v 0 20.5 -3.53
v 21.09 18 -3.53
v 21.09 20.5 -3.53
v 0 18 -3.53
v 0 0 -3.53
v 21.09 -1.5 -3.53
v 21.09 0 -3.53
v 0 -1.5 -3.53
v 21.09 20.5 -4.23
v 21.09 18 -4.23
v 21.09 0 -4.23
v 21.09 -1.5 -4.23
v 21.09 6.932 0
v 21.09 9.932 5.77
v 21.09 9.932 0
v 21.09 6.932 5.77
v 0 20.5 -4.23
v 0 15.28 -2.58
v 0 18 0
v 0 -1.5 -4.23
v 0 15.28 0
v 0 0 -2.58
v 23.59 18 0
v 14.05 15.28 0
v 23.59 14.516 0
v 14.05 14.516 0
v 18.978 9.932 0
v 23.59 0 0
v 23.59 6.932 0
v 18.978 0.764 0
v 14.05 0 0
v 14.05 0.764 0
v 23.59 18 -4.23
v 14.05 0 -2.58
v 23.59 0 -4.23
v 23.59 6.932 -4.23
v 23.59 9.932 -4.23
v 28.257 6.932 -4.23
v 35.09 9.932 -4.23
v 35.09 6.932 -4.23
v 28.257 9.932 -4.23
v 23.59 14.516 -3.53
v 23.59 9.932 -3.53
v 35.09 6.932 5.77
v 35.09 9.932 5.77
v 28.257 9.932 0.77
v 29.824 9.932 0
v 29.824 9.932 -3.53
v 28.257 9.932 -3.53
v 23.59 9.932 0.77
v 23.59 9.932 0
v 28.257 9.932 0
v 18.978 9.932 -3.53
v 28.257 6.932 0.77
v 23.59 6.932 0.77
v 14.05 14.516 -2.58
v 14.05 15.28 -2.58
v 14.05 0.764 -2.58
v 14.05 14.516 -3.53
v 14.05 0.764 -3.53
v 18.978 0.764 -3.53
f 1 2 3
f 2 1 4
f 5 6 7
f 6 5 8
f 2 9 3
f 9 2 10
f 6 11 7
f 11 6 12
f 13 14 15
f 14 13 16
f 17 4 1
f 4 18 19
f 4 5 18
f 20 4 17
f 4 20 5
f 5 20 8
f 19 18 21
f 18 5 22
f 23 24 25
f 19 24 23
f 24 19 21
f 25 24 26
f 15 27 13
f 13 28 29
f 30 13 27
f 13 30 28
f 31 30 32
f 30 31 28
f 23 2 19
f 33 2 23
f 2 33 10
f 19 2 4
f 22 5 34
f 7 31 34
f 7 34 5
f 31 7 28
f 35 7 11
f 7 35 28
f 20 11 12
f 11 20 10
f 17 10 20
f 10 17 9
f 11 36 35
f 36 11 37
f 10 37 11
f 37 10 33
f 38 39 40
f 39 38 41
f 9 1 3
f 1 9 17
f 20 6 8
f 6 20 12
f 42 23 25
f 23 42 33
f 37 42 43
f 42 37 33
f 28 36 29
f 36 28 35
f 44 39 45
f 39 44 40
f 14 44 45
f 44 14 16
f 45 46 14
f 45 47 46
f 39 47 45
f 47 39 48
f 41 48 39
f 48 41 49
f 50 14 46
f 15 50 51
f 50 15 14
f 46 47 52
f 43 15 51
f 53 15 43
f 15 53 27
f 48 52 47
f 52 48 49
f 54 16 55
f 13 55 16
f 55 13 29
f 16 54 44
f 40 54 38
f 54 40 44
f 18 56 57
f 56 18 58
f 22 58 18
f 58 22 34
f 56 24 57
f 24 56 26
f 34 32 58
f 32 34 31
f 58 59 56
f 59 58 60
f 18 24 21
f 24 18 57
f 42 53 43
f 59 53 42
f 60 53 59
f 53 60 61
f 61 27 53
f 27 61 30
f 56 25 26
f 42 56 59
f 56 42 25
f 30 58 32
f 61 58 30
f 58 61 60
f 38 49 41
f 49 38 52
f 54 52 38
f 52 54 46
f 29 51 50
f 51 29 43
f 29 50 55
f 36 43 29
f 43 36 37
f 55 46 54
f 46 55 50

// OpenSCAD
// Holder for matching FTDI 6 pin 0.1" header to the T2 case debug
// uart cutout

// External base measurements
// debug uart case cutout
cutoutXMM =  3.53;
cutoutYMM = 19.00;
cutoutZMM = 21.09;  // To base of male header

// FTDI 6 pin 0.1" measurements
serialXMM =  2.58;
serialYMM = 15.28;
serialZMM = 14.05;

// Internal base measurements
serialExtraYMM = 0.0;

cutoutReliefYMM = 1.0;

flangeExtraXMM = 0.35;
flangeExtraYMM = 3.00;
flangeExtraZMM = 0.00;

shoeBoxZMM = 2.50;

grabTabXMM = 10.00;
grabTabYMM =  3.00;
grabTabZMM = 14.00;

module handle() {
     effectiveCutoutYMM = cutoutYMM-cutoutReliefYMM;
     init = [cutoutXMM,effectiveCutoutYMM,cutoutZMM];
     hdr =  [serialXMM,serialYMM+serialExtraYMM,serialZMM];

     flangeSize=[2*flangeExtraXMM,
                 cutoutYMM+flangeExtraYMM,
                 cutoutZMM+flangeExtraZMM];
     flangePos=[cutoutXMM,-flangeExtraYMM/2,0];

     wireBoxSize = [cutoutXMM,
                    .90*hdr[1],
                    .70*(cutoutZMM-serialZMM)];
     wireBoxPos = [0,(hdr[1]-wireBoxSize[1])/2,serialZMM];

     shoeBoxSize = [cutoutXMM+2*flangeExtraXMM,effectiveCutoutYMM,shoeBoxZMM];
     shoeBoxPos = [0,0,cutoutZMM];

     wireExitSize = [cutoutXMM,
                     wireBoxSize[1]/3,
                     (cutoutZMM-shoeBoxSize[2]-0*serialZMM)-wireBoxSize[2]];
     wireExitPos = [0,wireBoxPos[1]+wireBoxSize[1]-wireExitSize[1],cutoutZMM-wireBoxSize[2]];

     grabTabSize = [grabTabXMM,grabTabYMM,grabTabZMM];
     grabTabPos = [cutoutXMM+flangeSize[0]-grabTabSize[0],
                   wireExitPos[1]-grabTabSize[1],
                   cutoutZMM];

     grabTabNotchSize = [grabTabXMM/2,grabTabYMM,grabTabZMM/3];
     grabTabNotchPos = [cutoutXMM+flangeSize[0]-grabTabNotchSize[0],
                   wireExitPos[1]-grabTabNotchSize[1],
                   cutoutZMM+shoeBoxZMM];

     difference () {
          union() {
               cube(init);
               translate(flangePos)
                    cube(flangeSize);
               translate(shoeBoxPos)
                    cube(shoeBoxSize);
               translate(grabTabPos)
                    cube(grabTabSize);
          }
          cube(hdr);
          translate(wireBoxPos)
               cube(wireBoxSize);
          translate(wireExitPos)
               cube(wireExitSize);
          translate(grabTabNotchPos)
               #cube(grabTabNotchSize);

     }
}

rotate([0,90,0])
handle();
